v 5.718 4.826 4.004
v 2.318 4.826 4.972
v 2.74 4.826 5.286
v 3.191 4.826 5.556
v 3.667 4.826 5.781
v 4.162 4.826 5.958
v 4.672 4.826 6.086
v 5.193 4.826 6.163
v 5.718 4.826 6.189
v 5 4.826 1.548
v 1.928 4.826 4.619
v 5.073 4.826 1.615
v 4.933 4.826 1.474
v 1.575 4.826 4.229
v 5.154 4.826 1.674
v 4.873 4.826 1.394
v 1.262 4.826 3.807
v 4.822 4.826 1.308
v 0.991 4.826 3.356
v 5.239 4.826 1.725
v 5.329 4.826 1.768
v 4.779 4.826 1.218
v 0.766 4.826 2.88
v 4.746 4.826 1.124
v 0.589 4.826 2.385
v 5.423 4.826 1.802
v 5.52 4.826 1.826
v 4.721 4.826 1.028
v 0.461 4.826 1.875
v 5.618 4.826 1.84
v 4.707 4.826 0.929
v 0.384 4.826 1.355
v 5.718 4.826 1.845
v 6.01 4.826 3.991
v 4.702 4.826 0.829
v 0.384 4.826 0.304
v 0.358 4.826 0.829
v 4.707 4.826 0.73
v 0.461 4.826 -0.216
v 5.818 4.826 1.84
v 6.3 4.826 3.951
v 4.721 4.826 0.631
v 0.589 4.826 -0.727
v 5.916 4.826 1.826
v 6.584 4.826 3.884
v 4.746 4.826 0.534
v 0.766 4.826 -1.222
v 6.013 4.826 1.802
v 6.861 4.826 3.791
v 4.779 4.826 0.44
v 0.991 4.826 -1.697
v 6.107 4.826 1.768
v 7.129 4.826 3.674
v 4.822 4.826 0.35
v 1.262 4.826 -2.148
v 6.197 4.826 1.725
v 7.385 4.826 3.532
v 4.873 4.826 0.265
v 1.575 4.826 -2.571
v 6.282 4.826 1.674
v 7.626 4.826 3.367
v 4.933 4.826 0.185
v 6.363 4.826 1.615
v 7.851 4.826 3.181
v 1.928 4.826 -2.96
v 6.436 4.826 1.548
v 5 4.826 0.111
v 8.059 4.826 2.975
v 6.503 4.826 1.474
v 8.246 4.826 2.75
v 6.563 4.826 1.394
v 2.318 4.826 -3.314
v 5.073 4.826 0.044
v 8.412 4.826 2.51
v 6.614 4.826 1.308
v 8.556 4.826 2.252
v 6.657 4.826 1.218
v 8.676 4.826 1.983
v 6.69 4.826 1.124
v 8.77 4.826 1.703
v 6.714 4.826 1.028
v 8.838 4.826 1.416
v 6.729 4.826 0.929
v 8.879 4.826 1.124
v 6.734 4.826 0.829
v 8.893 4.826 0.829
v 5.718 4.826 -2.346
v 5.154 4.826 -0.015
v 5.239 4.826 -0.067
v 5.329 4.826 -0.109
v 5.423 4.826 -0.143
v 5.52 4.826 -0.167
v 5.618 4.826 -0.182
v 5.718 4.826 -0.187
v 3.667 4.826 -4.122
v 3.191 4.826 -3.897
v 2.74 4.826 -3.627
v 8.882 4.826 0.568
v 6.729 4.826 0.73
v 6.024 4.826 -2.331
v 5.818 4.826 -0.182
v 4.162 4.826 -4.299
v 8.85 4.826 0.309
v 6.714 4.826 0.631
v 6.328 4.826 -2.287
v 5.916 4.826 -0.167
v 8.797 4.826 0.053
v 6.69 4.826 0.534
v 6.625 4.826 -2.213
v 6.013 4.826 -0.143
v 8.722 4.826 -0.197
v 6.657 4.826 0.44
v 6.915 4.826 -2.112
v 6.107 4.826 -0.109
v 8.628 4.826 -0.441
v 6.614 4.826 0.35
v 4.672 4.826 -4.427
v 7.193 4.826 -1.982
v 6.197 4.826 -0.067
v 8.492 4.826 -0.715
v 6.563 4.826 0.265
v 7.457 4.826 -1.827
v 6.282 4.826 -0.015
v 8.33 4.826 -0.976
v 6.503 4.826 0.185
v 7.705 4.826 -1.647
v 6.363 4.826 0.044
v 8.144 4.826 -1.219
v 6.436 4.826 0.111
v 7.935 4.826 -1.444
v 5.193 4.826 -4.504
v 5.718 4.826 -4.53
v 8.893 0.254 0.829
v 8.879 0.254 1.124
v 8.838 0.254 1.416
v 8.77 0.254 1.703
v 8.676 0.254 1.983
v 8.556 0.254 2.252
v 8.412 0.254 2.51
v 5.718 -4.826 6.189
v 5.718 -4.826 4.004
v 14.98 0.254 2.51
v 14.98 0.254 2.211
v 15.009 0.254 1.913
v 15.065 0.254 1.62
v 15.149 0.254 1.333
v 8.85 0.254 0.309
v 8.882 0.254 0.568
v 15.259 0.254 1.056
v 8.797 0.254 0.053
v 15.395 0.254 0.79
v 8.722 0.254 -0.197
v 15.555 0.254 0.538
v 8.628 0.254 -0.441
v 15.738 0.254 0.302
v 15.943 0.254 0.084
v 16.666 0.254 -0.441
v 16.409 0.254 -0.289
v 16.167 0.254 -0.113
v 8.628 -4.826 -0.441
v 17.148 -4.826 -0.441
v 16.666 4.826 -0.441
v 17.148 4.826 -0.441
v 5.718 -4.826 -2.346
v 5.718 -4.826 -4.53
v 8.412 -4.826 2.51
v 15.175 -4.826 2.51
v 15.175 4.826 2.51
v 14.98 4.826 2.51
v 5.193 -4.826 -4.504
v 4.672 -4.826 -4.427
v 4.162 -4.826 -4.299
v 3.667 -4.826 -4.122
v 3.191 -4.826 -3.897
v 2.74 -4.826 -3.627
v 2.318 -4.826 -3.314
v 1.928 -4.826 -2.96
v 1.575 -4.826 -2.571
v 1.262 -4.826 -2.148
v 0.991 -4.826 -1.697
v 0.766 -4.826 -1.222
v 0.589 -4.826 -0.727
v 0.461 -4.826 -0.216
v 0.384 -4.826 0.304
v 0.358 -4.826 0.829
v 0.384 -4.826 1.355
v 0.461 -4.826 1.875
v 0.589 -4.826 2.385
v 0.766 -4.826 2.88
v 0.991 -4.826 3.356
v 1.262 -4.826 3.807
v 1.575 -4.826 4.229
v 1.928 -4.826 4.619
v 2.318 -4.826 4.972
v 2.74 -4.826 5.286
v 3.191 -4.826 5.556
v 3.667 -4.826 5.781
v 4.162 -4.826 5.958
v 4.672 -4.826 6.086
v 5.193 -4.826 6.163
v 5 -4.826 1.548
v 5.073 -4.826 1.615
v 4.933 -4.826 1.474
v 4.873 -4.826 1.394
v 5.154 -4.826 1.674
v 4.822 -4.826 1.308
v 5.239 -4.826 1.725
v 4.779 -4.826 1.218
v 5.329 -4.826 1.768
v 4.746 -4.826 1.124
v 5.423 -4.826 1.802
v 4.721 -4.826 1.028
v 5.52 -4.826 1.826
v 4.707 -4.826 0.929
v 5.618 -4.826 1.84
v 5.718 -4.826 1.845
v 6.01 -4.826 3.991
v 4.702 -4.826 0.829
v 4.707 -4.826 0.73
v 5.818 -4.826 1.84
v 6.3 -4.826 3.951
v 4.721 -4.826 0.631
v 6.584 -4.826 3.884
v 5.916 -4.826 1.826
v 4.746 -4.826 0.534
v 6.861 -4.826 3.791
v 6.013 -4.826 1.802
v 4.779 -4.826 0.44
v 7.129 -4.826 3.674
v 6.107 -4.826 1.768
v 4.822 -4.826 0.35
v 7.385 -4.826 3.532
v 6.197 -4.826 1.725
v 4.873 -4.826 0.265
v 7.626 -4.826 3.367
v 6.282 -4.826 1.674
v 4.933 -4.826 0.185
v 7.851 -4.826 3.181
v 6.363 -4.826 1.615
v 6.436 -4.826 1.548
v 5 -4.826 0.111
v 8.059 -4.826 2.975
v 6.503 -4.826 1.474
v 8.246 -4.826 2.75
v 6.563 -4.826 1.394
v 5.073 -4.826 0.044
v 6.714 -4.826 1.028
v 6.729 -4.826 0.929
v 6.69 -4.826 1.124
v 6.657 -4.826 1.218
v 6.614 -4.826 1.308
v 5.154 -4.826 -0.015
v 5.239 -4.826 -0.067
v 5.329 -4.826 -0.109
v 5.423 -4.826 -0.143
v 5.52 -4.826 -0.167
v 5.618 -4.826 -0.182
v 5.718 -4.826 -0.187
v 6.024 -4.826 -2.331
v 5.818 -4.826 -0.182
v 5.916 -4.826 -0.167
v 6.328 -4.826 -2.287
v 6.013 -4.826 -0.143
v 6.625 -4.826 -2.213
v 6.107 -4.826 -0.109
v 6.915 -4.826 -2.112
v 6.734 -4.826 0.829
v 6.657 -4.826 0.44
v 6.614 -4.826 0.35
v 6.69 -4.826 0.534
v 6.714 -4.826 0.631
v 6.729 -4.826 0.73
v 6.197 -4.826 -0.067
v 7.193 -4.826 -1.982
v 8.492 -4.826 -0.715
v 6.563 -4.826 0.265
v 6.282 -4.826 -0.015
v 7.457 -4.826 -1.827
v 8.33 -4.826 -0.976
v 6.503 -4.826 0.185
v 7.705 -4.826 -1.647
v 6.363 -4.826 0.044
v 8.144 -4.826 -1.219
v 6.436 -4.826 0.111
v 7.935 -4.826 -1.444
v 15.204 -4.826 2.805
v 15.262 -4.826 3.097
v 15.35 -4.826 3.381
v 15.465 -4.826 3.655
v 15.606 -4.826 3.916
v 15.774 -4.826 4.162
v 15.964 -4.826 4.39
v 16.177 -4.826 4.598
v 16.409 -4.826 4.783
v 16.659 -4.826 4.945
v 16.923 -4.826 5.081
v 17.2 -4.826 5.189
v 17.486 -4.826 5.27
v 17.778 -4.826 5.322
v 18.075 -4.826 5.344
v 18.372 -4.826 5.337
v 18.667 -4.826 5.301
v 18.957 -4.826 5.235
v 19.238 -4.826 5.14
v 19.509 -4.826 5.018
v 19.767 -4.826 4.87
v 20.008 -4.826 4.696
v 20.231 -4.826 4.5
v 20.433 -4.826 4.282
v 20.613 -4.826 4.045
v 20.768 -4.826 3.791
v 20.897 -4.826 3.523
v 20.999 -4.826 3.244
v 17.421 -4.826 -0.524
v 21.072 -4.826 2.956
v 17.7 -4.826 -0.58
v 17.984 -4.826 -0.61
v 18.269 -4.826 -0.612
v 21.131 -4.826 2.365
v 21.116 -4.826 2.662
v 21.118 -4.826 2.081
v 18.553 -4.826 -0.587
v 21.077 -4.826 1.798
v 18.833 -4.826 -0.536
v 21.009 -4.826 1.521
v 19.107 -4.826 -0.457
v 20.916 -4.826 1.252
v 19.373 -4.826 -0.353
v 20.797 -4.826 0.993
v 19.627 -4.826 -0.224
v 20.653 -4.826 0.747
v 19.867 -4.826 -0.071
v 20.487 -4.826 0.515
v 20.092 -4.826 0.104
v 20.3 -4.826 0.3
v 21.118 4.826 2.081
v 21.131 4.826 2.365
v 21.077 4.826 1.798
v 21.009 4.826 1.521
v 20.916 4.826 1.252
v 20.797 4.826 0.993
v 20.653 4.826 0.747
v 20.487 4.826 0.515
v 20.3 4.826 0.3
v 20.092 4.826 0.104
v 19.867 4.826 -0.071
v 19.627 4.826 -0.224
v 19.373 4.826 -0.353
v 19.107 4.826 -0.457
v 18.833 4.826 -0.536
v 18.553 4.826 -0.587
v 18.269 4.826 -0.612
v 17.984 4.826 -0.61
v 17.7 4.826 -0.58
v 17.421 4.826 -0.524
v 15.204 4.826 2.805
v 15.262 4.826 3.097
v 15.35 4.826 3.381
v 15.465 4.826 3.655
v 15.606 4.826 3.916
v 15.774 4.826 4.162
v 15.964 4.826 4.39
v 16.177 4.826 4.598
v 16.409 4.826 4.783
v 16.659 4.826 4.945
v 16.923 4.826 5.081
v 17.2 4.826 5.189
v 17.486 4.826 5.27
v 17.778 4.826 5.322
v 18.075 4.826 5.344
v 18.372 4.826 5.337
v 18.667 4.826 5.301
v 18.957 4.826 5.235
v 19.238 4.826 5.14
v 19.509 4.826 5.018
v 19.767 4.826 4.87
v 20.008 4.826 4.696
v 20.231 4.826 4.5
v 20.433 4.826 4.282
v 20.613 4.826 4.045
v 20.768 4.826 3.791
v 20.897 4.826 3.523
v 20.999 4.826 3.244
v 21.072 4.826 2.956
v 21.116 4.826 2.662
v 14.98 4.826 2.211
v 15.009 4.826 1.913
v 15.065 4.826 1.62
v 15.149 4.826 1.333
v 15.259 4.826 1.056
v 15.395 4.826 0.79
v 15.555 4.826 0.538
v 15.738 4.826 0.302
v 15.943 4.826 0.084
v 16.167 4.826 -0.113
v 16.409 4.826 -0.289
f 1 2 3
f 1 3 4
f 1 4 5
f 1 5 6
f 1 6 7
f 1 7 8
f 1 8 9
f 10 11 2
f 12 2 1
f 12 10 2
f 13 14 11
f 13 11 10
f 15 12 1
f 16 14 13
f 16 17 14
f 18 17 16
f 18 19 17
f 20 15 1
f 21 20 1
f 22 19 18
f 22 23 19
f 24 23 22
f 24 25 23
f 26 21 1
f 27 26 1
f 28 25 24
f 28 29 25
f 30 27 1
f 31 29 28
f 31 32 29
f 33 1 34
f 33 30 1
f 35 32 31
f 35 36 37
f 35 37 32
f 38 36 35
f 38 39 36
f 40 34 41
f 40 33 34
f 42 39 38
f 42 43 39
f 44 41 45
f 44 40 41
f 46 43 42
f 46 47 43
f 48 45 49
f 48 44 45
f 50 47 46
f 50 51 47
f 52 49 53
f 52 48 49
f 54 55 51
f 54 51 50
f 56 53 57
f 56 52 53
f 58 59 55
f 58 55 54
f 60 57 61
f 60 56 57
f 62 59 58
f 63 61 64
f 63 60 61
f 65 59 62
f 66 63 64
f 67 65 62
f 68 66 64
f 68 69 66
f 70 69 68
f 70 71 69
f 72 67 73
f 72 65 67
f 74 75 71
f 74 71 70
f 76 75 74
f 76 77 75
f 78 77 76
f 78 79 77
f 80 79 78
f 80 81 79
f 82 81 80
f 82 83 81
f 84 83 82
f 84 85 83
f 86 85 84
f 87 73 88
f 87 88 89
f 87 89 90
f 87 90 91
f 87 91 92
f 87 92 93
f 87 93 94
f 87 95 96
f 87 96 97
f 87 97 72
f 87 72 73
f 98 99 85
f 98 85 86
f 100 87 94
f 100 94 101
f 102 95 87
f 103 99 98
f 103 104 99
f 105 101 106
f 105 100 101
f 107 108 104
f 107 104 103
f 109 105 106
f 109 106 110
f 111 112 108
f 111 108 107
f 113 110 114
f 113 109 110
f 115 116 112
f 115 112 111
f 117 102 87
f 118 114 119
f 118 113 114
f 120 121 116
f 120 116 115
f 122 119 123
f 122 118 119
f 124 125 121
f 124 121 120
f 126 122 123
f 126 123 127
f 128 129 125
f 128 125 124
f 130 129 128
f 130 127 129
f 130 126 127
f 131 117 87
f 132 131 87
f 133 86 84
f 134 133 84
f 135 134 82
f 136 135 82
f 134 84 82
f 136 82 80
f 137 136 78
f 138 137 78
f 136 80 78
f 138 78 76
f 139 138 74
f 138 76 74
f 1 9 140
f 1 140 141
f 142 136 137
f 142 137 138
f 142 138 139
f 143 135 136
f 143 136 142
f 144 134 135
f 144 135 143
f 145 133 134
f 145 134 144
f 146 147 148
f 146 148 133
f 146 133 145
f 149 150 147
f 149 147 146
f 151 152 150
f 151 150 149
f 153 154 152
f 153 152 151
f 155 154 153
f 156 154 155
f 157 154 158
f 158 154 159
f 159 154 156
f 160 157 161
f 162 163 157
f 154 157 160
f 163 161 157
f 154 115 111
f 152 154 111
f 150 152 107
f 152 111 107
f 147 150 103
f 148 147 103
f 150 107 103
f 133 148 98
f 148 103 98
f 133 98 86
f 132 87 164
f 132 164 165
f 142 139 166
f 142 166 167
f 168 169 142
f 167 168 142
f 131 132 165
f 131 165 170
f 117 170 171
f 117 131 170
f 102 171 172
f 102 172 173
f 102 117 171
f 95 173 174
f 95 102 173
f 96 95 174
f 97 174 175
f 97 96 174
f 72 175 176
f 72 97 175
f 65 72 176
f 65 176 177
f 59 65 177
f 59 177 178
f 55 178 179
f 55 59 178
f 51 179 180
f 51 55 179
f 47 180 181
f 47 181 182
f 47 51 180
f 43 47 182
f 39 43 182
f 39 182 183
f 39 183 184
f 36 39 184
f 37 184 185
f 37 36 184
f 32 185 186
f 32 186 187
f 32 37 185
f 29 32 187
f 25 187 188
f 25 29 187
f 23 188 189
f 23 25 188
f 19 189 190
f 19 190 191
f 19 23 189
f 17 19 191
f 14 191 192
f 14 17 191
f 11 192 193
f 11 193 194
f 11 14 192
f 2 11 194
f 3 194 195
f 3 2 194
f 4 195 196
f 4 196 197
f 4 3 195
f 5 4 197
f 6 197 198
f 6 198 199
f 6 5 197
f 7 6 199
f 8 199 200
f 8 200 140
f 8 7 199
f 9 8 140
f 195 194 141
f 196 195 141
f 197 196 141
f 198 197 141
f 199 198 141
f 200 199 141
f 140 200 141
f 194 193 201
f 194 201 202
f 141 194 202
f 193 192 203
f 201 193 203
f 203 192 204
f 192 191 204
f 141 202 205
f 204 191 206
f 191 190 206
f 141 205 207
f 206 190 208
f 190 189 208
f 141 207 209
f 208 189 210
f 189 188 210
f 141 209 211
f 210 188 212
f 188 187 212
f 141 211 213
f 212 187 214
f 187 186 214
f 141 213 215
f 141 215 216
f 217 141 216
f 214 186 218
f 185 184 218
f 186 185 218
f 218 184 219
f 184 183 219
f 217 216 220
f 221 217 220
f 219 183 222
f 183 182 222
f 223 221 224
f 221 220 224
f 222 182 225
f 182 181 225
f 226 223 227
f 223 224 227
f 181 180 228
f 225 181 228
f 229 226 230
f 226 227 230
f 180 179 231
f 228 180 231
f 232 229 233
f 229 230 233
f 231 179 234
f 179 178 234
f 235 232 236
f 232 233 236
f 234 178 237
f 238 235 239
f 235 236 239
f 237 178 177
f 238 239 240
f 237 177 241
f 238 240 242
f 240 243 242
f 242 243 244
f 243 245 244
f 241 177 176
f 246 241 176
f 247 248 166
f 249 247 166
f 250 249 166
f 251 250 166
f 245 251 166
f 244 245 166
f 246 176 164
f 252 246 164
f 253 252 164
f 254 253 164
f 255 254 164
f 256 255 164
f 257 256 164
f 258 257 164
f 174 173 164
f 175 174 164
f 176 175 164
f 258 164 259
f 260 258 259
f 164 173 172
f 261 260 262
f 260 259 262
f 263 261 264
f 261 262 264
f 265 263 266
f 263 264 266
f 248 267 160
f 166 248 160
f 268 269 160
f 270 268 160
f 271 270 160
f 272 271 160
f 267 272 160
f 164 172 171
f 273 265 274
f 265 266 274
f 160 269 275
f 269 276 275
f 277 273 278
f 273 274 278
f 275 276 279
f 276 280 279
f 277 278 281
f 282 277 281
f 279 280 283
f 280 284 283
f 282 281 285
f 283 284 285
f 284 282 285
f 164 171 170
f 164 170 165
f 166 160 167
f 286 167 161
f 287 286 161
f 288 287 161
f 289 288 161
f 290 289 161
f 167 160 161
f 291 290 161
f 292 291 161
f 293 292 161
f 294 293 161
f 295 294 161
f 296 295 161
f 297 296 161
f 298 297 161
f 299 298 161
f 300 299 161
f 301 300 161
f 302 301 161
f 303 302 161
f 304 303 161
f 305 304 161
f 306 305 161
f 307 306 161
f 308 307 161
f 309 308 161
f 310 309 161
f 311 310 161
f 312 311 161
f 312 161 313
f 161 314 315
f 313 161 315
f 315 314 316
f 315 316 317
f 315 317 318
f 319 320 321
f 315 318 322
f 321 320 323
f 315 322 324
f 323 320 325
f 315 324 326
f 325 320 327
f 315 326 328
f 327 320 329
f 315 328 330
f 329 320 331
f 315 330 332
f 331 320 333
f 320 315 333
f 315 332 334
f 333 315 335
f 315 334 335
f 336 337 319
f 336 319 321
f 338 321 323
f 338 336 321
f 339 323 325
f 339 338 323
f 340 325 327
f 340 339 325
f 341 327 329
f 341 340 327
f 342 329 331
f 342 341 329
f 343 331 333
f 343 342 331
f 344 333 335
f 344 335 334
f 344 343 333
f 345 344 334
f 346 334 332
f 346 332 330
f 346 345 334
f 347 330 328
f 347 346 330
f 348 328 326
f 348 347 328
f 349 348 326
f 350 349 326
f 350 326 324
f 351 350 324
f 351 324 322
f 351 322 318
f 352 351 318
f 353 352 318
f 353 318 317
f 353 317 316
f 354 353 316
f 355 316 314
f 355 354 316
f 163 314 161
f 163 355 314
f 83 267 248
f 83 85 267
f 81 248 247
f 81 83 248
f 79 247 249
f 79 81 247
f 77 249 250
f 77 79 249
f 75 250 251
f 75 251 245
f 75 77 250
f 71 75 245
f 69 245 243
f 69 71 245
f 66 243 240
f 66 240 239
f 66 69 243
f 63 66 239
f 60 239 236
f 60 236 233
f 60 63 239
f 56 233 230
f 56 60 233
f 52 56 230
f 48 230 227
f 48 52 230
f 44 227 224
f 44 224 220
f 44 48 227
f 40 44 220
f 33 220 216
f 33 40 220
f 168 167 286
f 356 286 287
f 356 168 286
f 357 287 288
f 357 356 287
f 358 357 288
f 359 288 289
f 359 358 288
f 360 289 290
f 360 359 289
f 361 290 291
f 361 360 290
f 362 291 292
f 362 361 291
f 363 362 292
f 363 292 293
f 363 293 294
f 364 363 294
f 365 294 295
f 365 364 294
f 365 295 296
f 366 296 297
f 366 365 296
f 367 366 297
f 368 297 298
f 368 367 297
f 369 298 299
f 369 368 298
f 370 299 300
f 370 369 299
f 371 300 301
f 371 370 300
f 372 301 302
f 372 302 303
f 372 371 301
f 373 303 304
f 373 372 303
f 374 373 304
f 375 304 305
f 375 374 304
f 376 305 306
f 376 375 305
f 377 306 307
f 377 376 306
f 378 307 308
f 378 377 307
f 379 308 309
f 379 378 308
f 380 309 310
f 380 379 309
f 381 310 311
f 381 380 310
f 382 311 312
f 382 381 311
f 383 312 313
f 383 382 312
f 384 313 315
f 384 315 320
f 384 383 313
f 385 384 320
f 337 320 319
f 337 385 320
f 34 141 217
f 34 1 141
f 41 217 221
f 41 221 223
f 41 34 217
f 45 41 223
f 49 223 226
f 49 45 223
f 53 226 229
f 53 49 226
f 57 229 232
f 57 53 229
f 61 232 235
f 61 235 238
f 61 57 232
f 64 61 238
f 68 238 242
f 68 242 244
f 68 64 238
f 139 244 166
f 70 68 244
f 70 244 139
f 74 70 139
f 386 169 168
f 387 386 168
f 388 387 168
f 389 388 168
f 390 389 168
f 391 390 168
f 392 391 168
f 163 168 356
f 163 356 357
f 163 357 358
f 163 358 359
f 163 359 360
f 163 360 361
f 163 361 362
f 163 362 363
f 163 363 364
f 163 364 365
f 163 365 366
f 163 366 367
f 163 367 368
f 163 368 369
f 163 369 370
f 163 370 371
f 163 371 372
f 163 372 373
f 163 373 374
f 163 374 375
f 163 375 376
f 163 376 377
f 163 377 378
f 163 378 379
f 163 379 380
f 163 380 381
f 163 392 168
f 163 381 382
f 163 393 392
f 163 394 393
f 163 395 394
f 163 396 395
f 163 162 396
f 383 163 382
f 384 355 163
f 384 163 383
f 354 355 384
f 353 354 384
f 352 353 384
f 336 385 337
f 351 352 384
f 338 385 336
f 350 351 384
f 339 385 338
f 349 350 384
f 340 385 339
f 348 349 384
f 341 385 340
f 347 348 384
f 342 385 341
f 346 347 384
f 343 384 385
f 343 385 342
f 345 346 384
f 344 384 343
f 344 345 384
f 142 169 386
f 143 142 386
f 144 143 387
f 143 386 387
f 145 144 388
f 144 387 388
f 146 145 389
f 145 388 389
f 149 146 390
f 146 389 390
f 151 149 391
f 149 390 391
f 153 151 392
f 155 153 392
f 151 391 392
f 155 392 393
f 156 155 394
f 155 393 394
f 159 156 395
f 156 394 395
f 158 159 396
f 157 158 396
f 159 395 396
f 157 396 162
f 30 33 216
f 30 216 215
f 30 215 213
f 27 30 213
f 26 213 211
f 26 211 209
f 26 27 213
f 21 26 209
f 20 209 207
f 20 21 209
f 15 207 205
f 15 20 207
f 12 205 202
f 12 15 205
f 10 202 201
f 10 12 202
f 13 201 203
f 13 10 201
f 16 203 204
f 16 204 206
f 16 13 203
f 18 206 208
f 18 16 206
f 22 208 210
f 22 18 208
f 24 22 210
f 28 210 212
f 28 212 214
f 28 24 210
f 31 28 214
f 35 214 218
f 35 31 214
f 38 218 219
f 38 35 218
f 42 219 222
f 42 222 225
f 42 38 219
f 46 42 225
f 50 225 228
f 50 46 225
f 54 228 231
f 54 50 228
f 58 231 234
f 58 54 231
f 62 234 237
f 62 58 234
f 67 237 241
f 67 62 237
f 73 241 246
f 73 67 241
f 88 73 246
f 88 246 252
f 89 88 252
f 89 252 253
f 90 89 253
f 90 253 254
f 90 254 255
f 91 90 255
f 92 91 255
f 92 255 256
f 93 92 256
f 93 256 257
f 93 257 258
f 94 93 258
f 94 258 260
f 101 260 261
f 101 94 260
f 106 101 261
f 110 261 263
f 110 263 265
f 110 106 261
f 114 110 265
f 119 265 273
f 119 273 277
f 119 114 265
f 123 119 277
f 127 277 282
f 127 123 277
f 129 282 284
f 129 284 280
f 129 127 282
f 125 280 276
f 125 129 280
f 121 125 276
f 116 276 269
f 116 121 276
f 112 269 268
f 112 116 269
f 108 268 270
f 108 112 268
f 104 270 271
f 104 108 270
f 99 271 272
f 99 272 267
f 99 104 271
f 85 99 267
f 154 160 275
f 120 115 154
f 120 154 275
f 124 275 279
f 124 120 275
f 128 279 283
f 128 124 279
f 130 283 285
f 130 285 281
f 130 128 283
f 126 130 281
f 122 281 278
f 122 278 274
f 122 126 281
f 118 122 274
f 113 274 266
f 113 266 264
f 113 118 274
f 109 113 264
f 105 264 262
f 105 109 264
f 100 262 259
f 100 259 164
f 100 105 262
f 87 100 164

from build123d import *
from build123d.topology import SkipClean

# Parameters (mm, degrees)
BOSS_EXTRUDE3_DEPTH      = 4.826
BOSS_EXTRUDE3_DEPTH_BACK = 4.826
SKETCH1_R                = 1.016
CUT_EXTRUDE1_START       = -4.572
CUT_EXTRUDE1_DEPTH       = 4.572


with BuildPart() as part:
    # Sketch1 → Boss-Extrude3 (new, two sides: drawn at the far end of the back side and taken through both)
    with BuildSketch(Plane(origin=(0, 0, 0), x_dir=(1, 0, 0), z_dir=(0, 1, 0)).offset(-BOSS_EXTRUDE3_DEPTH_BACK)):
        with BuildLine():
            Line((5.7179716, 2.345697152), (5.7179716, 4.530275324))
            ThreePointArc((5.7179716, 4.530275324), (0.358393428, -0.829302848), (5.7179716, -6.18888102))
            Line((5.7179716, -6.18888102), (5.7179716, -4.004302848))
            ThreePointArc((5.7179716, -4.004302848), (7.258416359, -3.605569216), (8.411946387, -2.509518561))
            Line((8.411946387, -2.509518561), (15.174656113, -2.509518561))
            ThreePointArc((15.174656113, -2.509518561), (20.628265967, -4.022228083), (17.1479716, 0.440697152))
            Line((17.1479716, 0.440697152), (8.627907166, 0.440697152))
            ThreePointArc((8.627907166, 0.440697152), (7.45699072, 1.827092736), (5.7179716, 2.345697152))
        make_face()
        with Locations((5.7179716, -0.829302848)):
            Circle(SKETCH1_R, mode=Mode.SUBTRACT)
    extrude(amount=BOSS_EXTRUDE3_DEPTH + BOSS_EXTRUDE3_DEPTH_BACK)

    # Sketch4 → Cut-Extrude1 (cut)
    with SkipClean():  # the faces are left unmerged after this step: merging them gives an invalid solid
        with BuildSketch(Plane(origin=(0, 4.826, 0), x_dir=(1, 0, 0), z_dir=(0, 1, 0)).offset(CUT_EXTRUDE1_START)):
            with BuildLine():
                ThreePointArc((8.8929716, -0.829302848), (8.77034731, -1.703160688), (8.411946387, -2.509518561))
                Line((8.411946387, -2.509518561), (14.979501919, -2.509518561))
                ThreePointArc((14.979501919, -2.509518561), (15.394757752, -0.789817872), (16.665836289, 0.440697152))
                Line((16.665836289, 0.440697152), (8.627907166, 0.440697152))
                ThreePointArc((8.627907166, 0.440697152), (8.825999143, -0.180619729), (8.8929716, -0.829302848))
            make_face()
        extrude(amount=CUT_EXTRUDE1_DEPTH, mode=Mode.SUBTRACT)


solid = part.part
